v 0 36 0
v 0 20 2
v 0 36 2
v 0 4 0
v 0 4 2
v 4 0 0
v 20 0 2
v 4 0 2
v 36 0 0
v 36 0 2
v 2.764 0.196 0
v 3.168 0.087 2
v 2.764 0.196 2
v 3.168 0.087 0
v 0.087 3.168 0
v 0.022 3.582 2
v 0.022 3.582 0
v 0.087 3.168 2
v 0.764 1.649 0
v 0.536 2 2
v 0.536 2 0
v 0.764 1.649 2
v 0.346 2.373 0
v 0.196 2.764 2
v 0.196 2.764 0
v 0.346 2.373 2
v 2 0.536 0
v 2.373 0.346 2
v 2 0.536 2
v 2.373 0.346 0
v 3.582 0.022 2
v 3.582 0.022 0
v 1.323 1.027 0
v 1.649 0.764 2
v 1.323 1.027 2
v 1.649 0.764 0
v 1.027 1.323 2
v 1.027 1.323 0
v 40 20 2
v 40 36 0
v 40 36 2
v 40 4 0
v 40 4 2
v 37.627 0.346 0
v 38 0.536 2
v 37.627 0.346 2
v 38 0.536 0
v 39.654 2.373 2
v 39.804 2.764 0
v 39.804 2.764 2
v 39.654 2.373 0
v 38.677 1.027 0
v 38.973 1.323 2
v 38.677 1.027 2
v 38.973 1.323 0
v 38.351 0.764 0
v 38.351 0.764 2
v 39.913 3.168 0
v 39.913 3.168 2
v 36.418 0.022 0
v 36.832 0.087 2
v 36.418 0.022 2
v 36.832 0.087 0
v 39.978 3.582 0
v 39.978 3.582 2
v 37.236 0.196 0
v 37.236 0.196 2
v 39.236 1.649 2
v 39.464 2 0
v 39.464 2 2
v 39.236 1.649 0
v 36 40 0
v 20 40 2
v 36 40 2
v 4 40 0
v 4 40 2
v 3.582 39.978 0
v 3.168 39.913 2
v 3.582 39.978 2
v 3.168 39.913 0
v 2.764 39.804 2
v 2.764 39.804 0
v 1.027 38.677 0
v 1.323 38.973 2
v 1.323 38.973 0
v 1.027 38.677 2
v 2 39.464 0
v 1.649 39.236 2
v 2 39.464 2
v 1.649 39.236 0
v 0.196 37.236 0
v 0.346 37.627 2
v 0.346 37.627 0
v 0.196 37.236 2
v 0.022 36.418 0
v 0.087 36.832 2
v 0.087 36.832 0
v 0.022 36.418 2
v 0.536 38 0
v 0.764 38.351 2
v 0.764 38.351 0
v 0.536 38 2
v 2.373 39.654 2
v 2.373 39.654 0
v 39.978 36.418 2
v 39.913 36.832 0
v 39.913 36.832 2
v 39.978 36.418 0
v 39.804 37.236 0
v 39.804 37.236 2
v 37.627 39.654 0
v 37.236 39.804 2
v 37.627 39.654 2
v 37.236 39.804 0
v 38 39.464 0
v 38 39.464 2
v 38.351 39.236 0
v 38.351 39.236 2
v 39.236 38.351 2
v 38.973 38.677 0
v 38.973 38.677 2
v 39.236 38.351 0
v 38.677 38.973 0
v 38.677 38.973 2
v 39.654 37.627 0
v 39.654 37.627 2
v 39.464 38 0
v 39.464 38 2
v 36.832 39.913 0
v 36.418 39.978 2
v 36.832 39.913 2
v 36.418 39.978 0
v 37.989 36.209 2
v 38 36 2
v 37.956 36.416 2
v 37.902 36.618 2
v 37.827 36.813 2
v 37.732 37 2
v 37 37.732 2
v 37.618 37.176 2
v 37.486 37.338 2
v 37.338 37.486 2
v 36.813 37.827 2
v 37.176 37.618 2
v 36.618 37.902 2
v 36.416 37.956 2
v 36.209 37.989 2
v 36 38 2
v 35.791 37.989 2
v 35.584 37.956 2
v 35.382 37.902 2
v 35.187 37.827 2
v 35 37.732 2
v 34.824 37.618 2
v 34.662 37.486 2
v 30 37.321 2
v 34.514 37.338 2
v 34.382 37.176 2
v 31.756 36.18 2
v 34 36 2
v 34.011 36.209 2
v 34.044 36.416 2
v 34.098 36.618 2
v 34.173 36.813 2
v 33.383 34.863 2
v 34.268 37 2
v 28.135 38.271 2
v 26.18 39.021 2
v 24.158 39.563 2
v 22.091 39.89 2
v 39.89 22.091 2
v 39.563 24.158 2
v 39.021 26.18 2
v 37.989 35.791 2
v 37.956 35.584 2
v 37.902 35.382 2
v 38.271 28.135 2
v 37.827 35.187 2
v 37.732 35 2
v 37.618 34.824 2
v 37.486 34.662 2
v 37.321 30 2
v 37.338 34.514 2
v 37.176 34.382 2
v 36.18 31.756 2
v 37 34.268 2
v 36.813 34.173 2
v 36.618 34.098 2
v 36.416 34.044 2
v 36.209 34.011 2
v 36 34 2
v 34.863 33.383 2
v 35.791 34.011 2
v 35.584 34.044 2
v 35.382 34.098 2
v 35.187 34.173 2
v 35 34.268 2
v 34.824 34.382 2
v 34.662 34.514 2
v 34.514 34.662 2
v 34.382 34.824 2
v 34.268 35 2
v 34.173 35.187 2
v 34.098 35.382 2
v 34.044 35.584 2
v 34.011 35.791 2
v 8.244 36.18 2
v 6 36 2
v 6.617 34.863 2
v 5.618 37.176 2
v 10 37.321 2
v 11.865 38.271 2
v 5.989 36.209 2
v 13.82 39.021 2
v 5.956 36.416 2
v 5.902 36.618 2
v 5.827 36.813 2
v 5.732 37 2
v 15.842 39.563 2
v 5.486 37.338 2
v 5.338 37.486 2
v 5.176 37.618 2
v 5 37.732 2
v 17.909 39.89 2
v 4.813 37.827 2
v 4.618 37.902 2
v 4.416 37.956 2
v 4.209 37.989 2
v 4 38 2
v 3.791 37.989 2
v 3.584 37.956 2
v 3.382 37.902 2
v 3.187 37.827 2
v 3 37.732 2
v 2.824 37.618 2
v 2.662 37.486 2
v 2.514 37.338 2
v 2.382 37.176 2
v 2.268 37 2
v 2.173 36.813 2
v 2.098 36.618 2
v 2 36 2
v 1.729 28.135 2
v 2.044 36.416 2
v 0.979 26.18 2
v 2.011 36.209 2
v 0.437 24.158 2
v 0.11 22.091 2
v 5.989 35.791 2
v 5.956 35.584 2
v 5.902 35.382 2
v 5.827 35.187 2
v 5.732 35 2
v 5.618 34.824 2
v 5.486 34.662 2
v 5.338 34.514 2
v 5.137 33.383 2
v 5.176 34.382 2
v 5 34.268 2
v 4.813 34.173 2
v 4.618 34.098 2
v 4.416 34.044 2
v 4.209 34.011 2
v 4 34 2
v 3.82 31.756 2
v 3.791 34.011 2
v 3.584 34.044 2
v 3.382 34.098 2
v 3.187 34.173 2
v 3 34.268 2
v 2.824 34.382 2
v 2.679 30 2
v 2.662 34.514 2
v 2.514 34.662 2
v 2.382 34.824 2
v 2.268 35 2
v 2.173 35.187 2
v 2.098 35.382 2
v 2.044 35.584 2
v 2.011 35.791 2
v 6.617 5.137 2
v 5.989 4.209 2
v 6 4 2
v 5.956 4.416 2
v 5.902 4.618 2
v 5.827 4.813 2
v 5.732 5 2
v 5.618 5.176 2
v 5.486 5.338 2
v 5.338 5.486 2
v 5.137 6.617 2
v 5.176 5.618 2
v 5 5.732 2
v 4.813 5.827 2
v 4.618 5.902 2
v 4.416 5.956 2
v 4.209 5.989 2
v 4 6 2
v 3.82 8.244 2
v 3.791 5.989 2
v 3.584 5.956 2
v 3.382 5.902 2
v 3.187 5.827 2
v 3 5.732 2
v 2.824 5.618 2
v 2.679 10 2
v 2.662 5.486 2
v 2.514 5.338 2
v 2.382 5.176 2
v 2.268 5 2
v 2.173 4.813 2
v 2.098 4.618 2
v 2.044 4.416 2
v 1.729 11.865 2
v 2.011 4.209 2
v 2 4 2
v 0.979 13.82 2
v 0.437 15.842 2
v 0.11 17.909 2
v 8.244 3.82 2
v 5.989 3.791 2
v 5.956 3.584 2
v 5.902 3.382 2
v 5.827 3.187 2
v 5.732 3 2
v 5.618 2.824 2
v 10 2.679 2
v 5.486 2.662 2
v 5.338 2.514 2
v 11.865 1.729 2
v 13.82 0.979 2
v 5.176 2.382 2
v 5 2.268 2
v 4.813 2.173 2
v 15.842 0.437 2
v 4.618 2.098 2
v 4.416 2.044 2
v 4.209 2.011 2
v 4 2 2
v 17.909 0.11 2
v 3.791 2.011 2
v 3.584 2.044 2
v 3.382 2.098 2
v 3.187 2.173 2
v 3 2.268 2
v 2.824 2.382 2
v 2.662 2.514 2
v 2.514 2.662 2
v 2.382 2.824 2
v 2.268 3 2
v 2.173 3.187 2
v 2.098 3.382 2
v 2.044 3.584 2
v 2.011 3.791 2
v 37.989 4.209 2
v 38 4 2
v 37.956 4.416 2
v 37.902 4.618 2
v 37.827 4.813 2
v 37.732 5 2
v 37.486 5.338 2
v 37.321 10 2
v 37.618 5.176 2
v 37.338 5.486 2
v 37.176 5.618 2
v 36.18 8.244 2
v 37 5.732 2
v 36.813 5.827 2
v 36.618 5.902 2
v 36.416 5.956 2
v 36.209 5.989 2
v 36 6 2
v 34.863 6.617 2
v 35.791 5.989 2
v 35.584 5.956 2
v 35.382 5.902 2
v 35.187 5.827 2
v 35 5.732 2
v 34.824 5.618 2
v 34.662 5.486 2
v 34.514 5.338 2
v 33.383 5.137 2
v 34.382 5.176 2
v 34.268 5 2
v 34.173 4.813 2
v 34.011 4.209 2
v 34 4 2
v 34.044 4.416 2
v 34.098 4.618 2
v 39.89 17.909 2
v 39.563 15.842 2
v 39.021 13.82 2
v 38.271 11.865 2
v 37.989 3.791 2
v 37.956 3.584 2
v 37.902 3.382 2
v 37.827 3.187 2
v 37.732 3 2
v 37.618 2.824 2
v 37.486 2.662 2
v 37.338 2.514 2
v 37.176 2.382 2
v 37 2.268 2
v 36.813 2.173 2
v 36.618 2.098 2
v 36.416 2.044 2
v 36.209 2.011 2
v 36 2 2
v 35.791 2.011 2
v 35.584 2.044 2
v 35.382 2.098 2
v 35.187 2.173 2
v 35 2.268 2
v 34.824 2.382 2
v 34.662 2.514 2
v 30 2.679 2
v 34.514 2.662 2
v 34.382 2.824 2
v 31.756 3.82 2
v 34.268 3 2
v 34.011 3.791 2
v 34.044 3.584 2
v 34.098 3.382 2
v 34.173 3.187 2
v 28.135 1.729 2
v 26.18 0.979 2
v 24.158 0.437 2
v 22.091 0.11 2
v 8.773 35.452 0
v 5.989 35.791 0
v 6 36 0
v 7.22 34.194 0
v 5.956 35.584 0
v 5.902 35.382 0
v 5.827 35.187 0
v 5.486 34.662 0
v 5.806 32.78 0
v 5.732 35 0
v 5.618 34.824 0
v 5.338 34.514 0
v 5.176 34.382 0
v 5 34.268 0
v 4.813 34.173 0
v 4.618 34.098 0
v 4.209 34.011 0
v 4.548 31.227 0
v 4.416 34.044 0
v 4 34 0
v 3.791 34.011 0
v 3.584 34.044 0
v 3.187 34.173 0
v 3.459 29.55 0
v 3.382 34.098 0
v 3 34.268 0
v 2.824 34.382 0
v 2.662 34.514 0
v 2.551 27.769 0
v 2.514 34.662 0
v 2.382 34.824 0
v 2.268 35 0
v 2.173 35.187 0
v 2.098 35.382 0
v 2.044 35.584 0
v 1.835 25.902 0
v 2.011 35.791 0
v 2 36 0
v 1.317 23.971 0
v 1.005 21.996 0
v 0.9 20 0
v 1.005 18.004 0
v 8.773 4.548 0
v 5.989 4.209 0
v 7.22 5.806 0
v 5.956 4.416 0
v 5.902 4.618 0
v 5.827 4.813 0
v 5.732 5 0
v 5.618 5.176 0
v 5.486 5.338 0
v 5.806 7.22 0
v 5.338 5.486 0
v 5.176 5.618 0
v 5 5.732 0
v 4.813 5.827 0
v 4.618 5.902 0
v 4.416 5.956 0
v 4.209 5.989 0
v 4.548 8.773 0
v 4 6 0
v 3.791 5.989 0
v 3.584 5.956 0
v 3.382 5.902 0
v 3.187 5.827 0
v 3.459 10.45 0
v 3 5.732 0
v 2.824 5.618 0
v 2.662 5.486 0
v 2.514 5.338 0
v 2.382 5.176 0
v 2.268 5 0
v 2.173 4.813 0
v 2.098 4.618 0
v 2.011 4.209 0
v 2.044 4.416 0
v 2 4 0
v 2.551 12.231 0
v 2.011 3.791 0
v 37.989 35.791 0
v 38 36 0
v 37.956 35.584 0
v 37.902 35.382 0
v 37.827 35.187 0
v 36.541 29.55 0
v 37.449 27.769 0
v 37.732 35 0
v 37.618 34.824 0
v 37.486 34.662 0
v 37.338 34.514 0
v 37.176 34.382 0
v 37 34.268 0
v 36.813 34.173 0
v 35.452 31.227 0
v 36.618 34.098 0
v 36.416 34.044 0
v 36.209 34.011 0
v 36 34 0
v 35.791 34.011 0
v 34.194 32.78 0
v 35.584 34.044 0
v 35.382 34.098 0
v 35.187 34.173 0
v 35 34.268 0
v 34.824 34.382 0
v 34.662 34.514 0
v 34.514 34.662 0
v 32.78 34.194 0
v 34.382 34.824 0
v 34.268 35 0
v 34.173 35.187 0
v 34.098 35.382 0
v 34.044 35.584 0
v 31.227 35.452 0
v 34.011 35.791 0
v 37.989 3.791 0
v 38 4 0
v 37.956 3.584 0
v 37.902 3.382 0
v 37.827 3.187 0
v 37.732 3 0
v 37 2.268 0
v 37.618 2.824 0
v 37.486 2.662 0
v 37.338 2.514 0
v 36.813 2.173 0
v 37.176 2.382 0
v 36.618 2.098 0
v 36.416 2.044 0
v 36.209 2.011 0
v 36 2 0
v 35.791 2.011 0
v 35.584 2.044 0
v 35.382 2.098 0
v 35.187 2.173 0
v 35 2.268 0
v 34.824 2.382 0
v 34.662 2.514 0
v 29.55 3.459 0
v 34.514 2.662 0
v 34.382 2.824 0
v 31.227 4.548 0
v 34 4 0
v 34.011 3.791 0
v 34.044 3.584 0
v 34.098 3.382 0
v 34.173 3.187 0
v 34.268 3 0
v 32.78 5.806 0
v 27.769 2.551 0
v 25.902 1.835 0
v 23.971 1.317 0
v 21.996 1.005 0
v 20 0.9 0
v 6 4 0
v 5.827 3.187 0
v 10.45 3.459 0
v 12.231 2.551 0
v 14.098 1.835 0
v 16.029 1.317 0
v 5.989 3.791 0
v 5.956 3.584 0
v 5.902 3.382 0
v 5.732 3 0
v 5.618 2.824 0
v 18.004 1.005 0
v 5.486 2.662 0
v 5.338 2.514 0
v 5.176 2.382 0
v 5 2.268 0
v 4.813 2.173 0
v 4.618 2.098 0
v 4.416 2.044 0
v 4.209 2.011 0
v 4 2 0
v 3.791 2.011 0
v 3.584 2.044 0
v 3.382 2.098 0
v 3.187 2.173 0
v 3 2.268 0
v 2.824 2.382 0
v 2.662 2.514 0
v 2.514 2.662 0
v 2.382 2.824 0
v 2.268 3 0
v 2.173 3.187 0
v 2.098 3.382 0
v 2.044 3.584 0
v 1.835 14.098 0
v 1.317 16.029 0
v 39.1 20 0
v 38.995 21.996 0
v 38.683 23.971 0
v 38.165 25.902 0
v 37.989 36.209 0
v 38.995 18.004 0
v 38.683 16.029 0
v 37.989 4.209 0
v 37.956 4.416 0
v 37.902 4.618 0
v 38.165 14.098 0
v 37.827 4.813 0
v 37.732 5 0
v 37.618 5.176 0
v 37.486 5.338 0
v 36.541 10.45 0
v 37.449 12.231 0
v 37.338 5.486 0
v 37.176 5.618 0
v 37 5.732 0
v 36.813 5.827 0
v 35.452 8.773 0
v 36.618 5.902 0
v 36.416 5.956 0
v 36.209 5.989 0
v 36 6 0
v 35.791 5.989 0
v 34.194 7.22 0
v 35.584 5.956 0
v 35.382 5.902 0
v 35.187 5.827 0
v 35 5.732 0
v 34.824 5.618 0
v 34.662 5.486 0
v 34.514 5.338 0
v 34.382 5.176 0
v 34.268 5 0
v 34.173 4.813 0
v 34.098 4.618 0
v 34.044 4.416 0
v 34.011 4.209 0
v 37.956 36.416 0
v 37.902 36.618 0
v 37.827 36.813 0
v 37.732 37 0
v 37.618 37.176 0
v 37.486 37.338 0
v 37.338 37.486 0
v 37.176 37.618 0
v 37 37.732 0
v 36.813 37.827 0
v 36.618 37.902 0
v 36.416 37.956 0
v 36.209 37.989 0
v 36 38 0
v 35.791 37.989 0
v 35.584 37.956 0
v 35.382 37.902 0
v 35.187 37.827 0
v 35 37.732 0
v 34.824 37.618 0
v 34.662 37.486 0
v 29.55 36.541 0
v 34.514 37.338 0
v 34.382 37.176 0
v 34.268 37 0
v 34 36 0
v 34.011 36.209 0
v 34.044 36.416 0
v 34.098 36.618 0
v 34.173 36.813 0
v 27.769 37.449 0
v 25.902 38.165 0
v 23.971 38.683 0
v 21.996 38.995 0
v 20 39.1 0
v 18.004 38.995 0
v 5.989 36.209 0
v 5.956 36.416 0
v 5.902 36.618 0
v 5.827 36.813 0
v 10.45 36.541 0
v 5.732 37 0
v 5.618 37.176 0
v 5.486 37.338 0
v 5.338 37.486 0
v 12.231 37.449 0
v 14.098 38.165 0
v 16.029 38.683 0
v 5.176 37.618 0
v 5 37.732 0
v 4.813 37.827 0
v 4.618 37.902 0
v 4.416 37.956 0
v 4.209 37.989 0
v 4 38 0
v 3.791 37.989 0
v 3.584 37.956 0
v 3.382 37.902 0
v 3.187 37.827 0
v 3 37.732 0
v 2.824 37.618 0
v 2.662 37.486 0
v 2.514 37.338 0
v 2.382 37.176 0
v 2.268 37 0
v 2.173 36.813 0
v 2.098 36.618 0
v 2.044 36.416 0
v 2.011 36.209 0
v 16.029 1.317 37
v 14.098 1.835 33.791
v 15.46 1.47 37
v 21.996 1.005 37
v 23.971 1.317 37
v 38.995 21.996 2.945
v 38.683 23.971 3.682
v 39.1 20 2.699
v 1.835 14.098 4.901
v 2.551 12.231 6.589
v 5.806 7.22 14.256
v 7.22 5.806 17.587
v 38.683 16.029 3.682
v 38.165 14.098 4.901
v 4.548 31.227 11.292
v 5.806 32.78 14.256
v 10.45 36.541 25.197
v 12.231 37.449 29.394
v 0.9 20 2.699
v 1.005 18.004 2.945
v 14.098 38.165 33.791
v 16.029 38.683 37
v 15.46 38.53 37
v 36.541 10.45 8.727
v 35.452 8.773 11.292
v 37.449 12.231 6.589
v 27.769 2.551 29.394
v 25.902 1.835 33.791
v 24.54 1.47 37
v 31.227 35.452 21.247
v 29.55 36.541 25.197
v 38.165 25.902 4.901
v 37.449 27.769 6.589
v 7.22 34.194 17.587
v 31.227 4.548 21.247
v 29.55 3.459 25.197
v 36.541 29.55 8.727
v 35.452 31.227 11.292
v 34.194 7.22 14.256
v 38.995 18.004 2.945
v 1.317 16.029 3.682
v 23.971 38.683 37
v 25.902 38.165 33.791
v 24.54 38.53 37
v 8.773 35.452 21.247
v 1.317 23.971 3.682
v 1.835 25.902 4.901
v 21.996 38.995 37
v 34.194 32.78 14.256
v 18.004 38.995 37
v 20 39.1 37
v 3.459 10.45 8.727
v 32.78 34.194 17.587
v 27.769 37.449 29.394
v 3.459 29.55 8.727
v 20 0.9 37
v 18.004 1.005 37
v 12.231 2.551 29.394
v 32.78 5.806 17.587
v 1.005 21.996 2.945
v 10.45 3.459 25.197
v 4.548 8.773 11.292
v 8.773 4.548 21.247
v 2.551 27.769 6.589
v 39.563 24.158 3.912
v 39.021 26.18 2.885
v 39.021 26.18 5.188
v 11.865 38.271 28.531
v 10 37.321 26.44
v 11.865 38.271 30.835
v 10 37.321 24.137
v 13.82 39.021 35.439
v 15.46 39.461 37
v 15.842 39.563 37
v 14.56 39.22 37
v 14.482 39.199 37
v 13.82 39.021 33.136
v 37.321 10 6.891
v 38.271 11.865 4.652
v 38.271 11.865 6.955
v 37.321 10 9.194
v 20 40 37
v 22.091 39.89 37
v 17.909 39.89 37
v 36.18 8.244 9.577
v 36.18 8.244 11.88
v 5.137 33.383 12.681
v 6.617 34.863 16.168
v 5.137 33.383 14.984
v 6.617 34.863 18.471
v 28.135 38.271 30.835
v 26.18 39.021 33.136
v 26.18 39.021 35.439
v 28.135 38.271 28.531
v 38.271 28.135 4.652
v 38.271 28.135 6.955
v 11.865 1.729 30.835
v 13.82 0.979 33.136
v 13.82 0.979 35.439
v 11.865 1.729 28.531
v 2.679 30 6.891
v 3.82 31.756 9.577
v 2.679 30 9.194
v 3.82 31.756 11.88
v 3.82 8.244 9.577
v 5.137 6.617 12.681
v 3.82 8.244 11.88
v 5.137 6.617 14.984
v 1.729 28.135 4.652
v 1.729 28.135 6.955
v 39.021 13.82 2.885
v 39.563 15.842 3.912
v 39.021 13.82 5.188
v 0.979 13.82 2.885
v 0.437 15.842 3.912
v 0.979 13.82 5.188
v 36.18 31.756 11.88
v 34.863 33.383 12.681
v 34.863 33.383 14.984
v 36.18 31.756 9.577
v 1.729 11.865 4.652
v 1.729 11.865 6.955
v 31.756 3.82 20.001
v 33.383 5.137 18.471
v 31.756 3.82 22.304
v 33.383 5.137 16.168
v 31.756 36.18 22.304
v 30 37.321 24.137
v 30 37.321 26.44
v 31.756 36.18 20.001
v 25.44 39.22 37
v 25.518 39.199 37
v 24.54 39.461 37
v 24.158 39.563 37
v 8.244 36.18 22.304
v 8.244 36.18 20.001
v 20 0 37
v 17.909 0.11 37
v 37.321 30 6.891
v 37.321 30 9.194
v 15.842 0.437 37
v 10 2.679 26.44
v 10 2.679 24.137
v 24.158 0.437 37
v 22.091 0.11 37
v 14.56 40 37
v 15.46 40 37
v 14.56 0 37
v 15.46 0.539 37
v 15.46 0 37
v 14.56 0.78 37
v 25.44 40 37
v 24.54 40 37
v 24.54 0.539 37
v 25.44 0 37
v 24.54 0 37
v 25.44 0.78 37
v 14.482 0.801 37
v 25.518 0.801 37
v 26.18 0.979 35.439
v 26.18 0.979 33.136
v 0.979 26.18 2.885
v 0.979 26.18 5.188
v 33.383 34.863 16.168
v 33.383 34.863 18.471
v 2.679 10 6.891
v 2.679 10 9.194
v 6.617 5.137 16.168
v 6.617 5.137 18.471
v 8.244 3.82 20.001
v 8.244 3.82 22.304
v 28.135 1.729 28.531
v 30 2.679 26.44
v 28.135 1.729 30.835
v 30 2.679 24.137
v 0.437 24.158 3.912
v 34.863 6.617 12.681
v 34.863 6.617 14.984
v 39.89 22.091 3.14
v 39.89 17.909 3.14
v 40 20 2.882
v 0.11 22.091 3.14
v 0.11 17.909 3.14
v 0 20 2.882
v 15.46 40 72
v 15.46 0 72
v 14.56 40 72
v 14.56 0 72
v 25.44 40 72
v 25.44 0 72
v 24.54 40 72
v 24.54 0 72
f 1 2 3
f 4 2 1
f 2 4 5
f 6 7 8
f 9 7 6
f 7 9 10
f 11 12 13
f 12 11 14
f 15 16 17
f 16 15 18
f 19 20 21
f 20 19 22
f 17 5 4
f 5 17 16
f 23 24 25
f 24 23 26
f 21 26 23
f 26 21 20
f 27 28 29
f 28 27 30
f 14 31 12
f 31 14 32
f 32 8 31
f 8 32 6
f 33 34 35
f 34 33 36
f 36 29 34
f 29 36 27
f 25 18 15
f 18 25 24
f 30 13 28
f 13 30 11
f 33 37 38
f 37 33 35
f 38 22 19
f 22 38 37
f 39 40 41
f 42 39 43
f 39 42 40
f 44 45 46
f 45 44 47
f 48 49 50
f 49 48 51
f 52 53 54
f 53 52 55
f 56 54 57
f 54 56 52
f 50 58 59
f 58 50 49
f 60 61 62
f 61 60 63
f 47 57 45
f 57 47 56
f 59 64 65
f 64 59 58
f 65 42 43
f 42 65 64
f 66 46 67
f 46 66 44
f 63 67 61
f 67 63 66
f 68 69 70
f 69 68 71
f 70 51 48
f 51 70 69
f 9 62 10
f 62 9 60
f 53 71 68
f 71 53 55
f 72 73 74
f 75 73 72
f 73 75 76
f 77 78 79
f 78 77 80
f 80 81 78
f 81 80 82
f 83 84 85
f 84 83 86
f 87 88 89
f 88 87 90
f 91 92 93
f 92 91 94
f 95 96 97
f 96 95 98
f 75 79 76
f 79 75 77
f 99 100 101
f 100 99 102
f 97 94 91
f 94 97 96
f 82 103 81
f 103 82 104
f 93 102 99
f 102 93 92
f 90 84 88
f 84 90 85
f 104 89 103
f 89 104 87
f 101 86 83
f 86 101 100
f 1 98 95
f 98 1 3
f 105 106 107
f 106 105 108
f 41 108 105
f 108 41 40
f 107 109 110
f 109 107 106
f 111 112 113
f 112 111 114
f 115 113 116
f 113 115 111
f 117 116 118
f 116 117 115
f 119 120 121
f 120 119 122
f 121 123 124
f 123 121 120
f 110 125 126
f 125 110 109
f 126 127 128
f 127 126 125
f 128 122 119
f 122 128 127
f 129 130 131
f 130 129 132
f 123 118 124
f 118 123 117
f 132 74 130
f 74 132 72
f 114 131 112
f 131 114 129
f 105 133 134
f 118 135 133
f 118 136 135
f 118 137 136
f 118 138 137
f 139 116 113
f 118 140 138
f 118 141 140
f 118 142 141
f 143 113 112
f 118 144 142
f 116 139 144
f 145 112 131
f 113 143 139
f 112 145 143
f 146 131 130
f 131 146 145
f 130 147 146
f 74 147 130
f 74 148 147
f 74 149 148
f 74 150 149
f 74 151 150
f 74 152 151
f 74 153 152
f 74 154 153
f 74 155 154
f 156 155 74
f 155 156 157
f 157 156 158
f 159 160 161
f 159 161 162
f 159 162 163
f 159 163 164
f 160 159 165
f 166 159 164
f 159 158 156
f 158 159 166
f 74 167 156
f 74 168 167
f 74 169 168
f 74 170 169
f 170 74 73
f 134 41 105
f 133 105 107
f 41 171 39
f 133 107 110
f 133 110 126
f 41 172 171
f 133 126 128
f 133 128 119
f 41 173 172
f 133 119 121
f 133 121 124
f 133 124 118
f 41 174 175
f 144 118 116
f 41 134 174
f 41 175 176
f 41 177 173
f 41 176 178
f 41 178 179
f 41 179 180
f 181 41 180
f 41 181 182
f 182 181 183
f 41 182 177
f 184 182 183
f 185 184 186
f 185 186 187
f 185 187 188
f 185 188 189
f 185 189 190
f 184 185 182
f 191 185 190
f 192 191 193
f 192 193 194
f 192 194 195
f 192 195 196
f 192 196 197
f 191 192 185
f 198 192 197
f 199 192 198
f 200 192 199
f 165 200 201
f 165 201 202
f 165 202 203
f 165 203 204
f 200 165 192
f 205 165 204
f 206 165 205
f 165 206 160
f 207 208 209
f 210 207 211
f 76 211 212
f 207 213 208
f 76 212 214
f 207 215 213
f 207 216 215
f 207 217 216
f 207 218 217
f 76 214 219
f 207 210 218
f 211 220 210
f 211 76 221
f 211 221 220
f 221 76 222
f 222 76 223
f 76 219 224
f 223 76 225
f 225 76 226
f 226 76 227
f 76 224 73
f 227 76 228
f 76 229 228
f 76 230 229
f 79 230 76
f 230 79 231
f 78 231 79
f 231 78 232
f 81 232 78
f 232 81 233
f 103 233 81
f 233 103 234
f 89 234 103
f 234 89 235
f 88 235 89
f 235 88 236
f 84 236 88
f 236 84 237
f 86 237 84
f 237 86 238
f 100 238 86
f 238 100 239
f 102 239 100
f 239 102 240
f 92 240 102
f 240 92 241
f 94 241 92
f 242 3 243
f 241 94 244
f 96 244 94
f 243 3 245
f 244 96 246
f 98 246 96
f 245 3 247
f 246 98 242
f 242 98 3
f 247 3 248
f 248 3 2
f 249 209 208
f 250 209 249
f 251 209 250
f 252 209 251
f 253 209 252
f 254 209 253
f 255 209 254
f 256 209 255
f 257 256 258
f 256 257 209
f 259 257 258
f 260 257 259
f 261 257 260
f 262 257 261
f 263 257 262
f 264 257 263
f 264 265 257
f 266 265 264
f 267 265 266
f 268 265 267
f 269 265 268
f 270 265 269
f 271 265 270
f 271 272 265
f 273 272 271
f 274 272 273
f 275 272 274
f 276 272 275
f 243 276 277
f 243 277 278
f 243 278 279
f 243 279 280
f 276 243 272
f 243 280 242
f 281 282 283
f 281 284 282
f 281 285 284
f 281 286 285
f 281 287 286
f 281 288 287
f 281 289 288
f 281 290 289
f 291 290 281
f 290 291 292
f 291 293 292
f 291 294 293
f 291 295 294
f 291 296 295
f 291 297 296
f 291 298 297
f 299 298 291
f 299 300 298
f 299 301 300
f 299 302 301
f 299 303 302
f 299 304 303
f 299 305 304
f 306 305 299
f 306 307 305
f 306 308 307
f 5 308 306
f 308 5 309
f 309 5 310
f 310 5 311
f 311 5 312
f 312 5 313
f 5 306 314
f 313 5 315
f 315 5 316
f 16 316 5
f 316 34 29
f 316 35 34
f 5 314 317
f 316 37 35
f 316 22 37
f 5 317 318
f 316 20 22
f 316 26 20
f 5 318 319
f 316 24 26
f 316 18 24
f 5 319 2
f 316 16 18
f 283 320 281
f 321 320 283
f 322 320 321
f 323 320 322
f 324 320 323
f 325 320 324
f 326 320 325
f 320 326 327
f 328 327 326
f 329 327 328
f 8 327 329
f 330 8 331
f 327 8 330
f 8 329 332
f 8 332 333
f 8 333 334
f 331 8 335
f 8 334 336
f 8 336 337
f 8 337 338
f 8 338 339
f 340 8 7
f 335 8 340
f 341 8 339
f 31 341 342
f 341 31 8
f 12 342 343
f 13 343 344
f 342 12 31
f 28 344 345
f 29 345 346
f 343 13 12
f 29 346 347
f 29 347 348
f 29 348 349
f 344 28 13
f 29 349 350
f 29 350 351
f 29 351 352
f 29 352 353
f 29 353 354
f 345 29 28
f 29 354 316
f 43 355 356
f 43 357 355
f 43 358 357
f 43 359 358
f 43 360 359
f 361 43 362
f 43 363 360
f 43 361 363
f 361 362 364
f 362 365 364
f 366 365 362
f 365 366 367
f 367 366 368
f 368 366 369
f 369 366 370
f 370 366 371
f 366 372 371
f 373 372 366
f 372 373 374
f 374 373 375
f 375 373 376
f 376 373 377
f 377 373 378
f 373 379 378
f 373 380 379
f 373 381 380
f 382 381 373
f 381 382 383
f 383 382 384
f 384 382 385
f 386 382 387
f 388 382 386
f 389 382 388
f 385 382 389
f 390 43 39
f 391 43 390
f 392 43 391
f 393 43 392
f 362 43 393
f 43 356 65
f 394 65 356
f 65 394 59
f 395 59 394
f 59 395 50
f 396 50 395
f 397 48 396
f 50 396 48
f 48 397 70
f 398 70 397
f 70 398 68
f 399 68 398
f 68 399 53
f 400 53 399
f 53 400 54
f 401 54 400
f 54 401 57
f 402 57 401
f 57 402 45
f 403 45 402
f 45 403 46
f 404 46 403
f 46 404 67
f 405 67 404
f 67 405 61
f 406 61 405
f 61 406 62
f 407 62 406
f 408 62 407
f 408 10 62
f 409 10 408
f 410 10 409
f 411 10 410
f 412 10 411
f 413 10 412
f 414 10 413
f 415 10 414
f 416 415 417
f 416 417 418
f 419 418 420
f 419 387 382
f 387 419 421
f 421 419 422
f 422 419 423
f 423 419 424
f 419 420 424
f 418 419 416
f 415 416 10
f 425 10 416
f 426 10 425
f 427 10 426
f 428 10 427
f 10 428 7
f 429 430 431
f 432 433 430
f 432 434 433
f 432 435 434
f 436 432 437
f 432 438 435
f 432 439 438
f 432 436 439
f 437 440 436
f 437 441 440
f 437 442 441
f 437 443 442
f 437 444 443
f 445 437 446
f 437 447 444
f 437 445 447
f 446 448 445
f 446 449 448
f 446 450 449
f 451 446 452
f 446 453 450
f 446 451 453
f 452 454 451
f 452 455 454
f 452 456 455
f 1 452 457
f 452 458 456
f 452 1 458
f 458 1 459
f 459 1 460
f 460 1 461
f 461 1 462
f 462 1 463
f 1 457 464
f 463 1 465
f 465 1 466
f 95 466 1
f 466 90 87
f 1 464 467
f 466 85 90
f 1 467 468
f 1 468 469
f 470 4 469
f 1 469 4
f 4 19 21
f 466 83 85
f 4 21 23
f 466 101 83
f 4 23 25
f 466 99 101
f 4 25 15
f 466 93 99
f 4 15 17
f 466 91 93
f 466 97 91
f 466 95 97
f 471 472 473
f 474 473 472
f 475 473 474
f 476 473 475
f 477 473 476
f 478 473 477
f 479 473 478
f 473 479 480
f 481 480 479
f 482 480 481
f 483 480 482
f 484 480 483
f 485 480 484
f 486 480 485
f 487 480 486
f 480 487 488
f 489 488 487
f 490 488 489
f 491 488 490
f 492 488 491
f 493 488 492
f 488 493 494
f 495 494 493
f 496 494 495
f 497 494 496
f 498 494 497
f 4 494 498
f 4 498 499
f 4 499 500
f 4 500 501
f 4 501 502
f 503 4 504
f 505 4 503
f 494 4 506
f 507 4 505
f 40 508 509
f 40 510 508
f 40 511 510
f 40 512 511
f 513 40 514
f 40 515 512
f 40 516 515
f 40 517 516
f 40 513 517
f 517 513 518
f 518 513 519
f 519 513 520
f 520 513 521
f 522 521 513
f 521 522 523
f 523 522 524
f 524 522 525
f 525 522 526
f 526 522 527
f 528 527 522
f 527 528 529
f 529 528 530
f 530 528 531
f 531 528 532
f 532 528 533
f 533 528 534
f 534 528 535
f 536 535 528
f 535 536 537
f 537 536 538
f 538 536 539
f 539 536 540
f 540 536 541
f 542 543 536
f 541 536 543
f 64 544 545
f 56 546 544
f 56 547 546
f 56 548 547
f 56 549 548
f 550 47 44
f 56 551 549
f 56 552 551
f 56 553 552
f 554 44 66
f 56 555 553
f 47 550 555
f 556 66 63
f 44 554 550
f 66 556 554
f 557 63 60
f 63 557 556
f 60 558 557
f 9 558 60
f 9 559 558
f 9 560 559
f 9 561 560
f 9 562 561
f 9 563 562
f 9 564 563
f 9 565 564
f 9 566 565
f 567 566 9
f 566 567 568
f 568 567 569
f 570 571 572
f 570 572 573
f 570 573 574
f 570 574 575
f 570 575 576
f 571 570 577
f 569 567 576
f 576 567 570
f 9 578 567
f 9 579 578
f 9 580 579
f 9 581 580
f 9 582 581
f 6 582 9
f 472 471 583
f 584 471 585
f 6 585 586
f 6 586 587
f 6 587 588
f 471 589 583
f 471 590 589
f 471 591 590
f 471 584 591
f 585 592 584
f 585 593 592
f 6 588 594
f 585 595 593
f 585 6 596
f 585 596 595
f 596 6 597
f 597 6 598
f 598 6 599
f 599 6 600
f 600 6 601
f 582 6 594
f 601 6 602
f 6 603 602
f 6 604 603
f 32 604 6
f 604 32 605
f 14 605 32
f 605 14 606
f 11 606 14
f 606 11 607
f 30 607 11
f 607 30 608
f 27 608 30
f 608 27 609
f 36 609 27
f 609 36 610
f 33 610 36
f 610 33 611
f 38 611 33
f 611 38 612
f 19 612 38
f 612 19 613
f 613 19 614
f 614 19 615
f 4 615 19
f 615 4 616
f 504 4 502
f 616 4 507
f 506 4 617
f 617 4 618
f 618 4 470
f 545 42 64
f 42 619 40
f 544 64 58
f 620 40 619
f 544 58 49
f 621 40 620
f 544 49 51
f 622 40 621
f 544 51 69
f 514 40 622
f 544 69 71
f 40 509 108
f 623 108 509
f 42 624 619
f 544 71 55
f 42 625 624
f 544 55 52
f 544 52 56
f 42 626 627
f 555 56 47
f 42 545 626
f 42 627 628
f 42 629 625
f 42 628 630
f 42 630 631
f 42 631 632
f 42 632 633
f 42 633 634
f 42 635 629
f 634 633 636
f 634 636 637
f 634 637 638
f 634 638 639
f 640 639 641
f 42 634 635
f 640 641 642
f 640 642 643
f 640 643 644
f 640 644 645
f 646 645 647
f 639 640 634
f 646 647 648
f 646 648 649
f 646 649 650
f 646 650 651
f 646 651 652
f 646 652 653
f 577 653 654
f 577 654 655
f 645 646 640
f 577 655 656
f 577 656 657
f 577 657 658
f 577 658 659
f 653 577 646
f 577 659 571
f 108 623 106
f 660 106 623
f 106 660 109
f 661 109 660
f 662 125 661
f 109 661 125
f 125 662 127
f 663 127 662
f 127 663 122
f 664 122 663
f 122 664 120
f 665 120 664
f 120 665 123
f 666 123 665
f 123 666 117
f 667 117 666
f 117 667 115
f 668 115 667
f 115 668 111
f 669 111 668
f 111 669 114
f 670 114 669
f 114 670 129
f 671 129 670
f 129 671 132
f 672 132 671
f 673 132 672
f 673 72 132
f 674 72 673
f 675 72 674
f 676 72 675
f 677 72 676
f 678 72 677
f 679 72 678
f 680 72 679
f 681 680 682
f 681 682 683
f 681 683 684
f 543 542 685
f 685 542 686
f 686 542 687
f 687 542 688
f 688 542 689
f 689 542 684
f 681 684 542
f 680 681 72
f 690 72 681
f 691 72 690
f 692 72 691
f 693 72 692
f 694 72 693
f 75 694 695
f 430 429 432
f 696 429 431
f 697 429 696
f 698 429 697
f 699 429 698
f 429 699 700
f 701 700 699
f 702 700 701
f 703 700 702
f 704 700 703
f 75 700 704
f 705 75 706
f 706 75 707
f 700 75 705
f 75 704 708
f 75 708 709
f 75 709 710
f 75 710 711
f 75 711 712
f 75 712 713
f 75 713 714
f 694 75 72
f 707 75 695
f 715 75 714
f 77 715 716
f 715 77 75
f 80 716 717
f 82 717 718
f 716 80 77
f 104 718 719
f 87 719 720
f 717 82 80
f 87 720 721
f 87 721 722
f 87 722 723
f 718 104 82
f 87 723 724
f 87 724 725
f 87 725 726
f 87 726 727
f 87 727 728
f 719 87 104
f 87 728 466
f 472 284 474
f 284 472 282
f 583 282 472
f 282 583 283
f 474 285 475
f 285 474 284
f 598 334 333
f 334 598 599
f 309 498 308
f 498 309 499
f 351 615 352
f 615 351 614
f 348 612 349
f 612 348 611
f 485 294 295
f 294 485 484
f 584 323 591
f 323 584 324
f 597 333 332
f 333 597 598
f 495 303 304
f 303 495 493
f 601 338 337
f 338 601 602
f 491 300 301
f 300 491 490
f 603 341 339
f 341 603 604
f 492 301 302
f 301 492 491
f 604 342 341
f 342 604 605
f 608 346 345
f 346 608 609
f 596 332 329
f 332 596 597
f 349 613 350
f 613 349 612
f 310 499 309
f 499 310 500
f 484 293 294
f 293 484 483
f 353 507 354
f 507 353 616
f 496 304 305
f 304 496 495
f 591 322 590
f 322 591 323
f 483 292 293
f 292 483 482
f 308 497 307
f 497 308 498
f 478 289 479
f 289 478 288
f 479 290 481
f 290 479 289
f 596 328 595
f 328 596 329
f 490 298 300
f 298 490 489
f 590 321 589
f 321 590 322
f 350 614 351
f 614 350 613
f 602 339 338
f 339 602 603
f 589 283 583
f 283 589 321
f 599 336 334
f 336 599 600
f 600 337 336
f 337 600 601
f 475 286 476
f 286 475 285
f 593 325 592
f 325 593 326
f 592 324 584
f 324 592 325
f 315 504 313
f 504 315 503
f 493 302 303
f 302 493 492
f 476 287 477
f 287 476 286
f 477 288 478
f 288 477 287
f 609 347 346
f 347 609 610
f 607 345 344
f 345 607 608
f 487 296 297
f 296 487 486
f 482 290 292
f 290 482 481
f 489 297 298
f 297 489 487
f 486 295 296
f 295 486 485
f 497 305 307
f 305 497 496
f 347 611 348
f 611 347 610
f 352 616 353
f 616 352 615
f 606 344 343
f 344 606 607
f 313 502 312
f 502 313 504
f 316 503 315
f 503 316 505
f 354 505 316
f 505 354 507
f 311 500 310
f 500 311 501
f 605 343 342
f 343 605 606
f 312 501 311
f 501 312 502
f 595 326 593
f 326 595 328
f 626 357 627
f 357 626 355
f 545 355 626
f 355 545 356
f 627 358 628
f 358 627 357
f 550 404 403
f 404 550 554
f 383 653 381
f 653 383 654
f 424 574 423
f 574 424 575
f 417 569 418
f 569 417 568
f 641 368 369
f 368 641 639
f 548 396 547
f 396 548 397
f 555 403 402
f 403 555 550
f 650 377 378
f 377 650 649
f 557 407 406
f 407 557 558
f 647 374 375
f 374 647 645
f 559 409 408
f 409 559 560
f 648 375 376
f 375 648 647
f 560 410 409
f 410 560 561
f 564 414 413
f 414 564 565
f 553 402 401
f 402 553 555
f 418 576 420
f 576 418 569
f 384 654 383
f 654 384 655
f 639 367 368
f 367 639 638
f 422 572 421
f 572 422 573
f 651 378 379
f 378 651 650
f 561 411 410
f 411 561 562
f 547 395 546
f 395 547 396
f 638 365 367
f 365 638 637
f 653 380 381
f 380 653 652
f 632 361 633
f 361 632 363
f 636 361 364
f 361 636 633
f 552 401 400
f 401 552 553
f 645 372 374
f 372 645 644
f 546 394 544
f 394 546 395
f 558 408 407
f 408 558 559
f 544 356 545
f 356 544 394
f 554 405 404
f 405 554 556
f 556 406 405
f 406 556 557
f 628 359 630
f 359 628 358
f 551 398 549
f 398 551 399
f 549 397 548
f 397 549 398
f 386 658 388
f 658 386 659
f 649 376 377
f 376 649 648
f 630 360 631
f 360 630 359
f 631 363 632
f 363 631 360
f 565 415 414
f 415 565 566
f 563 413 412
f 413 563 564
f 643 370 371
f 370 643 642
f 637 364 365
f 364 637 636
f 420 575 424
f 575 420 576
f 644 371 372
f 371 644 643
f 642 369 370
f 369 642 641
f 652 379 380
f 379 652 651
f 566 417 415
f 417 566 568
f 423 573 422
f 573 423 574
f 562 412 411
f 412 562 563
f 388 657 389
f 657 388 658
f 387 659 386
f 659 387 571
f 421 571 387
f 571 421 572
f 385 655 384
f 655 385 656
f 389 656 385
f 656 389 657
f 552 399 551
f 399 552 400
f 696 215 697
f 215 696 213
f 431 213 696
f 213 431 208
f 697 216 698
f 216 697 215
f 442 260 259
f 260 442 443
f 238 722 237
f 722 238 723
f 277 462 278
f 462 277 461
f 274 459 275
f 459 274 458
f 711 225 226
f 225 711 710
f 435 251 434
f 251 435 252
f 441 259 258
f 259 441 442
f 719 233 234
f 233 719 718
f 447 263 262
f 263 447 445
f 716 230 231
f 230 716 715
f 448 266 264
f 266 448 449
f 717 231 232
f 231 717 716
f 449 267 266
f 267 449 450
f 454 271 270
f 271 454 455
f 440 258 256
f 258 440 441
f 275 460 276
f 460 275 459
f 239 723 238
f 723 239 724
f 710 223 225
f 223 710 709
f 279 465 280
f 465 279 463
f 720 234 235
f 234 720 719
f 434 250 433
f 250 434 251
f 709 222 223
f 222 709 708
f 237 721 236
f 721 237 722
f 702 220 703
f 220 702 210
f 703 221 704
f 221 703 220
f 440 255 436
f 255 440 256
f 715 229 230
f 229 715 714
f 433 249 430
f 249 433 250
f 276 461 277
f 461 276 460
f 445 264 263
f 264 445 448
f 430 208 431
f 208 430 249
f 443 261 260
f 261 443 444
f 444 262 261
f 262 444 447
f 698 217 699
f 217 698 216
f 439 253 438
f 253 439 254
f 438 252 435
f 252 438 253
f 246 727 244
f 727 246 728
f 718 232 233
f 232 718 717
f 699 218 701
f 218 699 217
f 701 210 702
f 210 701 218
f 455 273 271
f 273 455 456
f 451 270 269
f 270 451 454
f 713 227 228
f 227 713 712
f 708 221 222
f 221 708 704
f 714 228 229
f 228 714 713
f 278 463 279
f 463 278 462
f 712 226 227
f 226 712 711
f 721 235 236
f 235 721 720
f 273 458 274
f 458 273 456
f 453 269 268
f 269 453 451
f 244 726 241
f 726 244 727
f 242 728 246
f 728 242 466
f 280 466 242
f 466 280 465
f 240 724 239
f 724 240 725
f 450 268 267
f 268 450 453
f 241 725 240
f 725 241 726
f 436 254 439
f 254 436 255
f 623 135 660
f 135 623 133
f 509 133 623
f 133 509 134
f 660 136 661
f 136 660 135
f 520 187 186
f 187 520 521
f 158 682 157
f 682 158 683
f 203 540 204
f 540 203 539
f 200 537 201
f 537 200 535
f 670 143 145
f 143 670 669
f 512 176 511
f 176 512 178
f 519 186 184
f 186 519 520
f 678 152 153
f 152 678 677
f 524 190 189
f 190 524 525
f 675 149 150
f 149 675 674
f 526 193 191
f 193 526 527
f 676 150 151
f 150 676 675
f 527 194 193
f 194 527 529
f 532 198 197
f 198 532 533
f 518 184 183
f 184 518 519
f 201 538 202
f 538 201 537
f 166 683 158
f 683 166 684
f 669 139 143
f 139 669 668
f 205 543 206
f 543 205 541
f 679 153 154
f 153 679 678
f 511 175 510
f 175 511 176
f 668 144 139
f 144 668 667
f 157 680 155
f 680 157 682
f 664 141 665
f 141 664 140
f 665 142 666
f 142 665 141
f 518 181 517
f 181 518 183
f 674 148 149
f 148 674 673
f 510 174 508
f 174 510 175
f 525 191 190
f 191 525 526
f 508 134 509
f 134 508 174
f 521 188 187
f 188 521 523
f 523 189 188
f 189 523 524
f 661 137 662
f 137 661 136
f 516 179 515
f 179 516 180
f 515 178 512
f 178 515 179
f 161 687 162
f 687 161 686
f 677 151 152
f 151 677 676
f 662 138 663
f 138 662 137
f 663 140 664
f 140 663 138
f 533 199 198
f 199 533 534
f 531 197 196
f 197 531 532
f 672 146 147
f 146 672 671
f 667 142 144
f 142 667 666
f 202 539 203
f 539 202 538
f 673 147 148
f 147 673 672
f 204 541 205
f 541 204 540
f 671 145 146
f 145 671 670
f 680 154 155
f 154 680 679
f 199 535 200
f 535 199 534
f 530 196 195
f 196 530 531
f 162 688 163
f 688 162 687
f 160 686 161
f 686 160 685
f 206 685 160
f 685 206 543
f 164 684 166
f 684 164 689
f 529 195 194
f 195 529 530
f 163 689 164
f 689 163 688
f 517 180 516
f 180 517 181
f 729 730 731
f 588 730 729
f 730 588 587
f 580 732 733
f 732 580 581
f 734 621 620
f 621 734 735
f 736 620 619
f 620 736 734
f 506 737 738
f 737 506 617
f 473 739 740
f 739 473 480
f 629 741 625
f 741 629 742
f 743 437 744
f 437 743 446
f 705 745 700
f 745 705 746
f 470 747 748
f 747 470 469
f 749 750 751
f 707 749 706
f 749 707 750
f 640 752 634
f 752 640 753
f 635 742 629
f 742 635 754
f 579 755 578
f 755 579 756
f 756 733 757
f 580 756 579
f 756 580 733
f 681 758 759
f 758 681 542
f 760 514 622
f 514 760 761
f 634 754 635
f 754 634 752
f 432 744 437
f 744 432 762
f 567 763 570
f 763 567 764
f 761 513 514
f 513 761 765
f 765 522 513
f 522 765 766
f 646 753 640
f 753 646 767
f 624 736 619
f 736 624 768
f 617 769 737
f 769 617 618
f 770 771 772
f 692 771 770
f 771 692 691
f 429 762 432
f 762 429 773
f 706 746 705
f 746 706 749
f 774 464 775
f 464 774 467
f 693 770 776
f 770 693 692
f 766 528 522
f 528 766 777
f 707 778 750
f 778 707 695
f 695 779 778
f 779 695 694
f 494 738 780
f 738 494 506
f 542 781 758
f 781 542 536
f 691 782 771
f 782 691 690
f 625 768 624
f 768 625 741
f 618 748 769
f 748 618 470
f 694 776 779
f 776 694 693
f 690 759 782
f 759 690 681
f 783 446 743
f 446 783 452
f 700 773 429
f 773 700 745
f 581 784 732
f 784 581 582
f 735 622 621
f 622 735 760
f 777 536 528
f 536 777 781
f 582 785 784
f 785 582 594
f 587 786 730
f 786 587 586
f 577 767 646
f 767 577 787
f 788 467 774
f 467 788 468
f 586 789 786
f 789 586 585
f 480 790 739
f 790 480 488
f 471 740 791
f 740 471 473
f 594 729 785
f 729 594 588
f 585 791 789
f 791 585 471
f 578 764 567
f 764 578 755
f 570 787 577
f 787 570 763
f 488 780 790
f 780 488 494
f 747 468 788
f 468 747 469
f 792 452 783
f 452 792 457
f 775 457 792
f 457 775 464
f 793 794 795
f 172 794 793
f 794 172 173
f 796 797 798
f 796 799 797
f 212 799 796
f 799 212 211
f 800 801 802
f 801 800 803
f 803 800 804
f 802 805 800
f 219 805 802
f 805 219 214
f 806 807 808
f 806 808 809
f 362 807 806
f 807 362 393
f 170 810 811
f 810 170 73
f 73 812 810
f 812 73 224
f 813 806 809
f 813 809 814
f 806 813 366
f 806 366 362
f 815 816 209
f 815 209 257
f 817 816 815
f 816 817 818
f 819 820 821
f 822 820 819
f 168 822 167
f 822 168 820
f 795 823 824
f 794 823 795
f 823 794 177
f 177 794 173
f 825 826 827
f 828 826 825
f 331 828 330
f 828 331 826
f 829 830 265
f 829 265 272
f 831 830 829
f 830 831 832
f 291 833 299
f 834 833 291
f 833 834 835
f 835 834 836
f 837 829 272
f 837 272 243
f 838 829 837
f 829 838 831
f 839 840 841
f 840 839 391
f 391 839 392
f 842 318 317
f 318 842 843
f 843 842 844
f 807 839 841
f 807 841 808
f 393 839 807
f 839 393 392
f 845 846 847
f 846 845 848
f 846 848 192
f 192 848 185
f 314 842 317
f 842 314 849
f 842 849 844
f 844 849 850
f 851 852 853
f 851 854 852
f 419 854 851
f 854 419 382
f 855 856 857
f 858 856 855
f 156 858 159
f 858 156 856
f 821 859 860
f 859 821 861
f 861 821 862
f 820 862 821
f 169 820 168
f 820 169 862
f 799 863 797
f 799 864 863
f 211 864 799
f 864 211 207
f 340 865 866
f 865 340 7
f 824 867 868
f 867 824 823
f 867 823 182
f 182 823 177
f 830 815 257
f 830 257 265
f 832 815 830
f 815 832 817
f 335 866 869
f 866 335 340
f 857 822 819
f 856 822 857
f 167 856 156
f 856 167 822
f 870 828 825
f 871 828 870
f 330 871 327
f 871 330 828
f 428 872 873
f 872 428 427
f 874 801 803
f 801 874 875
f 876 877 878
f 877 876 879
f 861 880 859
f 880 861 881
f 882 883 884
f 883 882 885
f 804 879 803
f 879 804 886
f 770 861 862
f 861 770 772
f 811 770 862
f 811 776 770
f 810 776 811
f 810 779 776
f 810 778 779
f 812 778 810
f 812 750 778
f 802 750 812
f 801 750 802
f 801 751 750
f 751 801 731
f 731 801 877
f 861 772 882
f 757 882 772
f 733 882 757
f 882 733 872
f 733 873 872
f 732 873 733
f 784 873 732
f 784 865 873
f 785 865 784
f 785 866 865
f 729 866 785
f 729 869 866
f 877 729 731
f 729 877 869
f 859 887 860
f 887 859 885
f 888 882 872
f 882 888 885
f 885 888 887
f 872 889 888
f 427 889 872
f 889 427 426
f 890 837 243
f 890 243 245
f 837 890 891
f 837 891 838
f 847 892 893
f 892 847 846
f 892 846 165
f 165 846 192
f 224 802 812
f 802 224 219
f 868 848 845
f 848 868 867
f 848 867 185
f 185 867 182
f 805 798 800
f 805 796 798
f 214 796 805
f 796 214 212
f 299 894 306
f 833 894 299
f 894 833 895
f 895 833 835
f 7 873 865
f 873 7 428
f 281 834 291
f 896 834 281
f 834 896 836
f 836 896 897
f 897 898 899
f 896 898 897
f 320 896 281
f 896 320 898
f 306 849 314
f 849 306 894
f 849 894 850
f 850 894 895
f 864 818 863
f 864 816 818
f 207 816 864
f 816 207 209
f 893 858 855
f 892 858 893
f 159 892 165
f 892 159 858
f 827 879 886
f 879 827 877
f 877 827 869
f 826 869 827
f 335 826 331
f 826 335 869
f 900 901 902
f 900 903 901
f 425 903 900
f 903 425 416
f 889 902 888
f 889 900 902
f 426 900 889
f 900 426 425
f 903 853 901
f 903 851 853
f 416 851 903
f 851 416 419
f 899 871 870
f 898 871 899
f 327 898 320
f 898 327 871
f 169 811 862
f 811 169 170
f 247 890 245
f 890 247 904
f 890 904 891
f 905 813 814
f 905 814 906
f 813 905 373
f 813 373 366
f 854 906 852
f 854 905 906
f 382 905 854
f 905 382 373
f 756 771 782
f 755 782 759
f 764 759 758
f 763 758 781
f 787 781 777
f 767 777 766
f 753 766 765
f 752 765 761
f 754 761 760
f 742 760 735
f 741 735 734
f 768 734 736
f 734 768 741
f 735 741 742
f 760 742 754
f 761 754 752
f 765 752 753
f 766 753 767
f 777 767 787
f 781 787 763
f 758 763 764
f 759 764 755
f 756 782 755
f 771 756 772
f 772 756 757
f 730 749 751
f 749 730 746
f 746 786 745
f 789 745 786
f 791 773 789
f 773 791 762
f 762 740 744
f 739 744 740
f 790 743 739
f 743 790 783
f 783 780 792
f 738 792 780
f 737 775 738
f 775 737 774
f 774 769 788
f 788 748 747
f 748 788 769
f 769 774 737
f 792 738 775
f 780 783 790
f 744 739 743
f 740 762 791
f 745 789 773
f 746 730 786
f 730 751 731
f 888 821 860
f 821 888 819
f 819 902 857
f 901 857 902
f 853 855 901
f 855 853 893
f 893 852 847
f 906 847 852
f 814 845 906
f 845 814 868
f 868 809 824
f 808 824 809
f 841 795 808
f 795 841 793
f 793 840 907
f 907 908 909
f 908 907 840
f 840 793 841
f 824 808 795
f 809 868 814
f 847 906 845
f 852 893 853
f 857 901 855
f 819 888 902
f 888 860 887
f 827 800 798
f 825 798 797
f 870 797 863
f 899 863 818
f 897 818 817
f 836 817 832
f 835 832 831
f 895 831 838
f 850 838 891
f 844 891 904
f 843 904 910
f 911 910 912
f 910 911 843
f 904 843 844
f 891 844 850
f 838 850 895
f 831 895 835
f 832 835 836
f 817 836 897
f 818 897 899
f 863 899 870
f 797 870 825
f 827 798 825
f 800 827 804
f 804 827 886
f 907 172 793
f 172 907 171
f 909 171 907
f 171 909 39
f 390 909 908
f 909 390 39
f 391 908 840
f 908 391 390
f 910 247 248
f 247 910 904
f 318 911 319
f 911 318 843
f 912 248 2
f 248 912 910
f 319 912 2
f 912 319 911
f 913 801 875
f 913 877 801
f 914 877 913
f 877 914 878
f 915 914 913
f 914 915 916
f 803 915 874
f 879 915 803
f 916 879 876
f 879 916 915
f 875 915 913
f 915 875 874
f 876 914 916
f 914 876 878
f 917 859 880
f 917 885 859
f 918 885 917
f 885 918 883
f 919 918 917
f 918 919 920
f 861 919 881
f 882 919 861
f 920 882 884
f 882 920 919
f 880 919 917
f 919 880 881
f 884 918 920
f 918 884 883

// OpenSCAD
BaseBorderSize      = 40;
BaseThickness       = 2;

ScrewHoleRadius     = 2;
ScrewHoleDistance   = 32;

ConeThickness       = 0.9;
ConeBaseRadius      = BaseBorderSize/2;
ConeTopRadius       = (BaseBorderSize/2)*1;
ConeHeight          = 35;


ConePlatPartAngle   = 23 ;
OpeningRatio        = 0.2;

LengthSupport       = BaseBorderSize/2;
WidthSupport        = 10;
ThichnessSupport    = 10;

$fn = 60;


module HeadFanMount()
{
    union()
    {
    
        difference() // BASE
        {
            cube([BaseBorderSize , BaseBorderSize , BaseThickness]);
            
            translate([(BaseBorderSize-ScrewHoleDistance)/2 , (BaseBorderSize-ScrewHoleDistance)/2 , -0.5])
            {
                cylinder(h = BaseThickness + 1 , r = ScrewHoleRadius);
            }
            
            translate([BaseBorderSize-(BaseBorderSize-ScrewHoleDistance)/2 , (BaseBorderSize-ScrewHoleDistance)/2 , -0.5])
            {
                cylinder(h = BaseThickness + 1 , r = ScrewHoleRadius);
            }
            
            translate([(BaseBorderSize-ScrewHoleDistance)/2 , BaseBorderSize-(BaseBorderSize-ScrewHoleDistance)/2 , -0.5])
            {
                cylinder(h = BaseThickness + 1 , r = ScrewHoleRadius);
            }
            
            translate([BaseBorderSize-(BaseBorderSize-ScrewHoleDistance)/2 , BaseBorderSize-(BaseBorderSize-ScrewHoleDistance)/2 , -0.5])
            {
                cylinder(h = BaseThickness + 1 , r = ScrewHoleRadius);
            }
            
            translate([BaseBorderSize/2 , BaseBorderSize/2 , -0.5])
            {
                cylinder(h = BaseThickness + 1 , r = ConeBaseRadius-ConeThickness);
            }
            
            difference()
            {
                translate([0 , 0 , -0.5])
                {
                    cube([(BaseBorderSize-ScrewHoleDistance)/2 , (BaseBorderSize-ScrewHoleDistance)/2 , BaseThickness + 1]);
                }
                translate([(BaseBorderSize-ScrewHoleDistance)/2 , (BaseBorderSize-ScrewHoleDistance)/2 , -1])
                {
                    cylinder(h = BaseThickness + 2 , r = (BaseBorderSize-ScrewHoleDistance)/2);
                }
            }
            difference()
            {
                translate([BaseBorderSize-(BaseBorderSize-ScrewHoleDistance)/2 , 0 , -0.5])
                {
                    cube([(BaseBorderSize-ScrewHoleDistance)/2 , (BaseBorderSize-ScrewHoleDistance)/2 , BaseThickness + 1]);
                }
                translate([BaseBorderSize-(BaseBorderSize-ScrewHoleDistance)/2 , (BaseBorderSize-ScrewHoleDistance)/2 , -1])
                {
                    cylinder(h = BaseThickness + 2 , r = (BaseBorderSize-ScrewHoleDistance)/2);
                }
            }
            difference()
            {
                translate([0 , BaseBorderSize-(BaseBorderSize-ScrewHoleDistance)/2 , -0.5])
                {
                    cube([(BaseBorderSize-ScrewHoleDistance)/2 , (BaseBorderSize-ScrewHoleDistance)/2 , BaseThickness + 1]);
                }
                translate([(BaseBorderSize-ScrewHoleDistance)/2 , BaseBorderSize-(BaseBorderSize-ScrewHoleDistance)/2 , -1])
                {
                    cylinder(h = BaseThickness + 2 , r = (BaseBorderSize-ScrewHoleDistance)/2);
                }
            }
            difference()
            {
                translate([BaseBorderSize-(BaseBorderSize-ScrewHoleDistance)/2 , BaseBorderSize-(BaseBorderSize-ScrewHoleDistance)/2 , -0.5])
                {
                    cube([(BaseBorderSize-ScrewHoleDistance)/2 , (BaseBorderSize-ScrewHoleDistance)/2 , BaseThickness + 1]);
                }
                translate([BaseBorderSize-(BaseBorderSize-ScrewHoleDistance)/2 , BaseBorderSize-(BaseBorderSize-ScrewHoleDistance)/2 , -1])
                {
                    cylinder(h = BaseThickness + 2 , r = (BaseBorderSize-ScrewHoleDistance)/2);
                }
            }
        }
        
        
        
        
        difference()    // Cone
        {
            translate([BaseBorderSize/2 , BaseBorderSize/2 , BaseThickness])
            {
                cylinder(h = ConeHeight , r1 = ConeBaseRadius , r2 = ConeTopRadius);
            }
            translate([BaseBorderSize/2 , BaseBorderSize/2 , BaseThickness-0.1])
            {
                cylinder(h = ConeHeight+0.2 , r1 = ConeBaseRadius-ConeThickness , r2 = ConeTopRadius-ConeThickness);
            }
            translate([(BaseBorderSize/2-ConeTopRadius+ConeThickness)+(ConeHeight+BaseThickness)*tan(ConePlatPartAngle)+(ConeTopRadius/2-ConeThickness)*2*OpeningRatio+ConeTopRadius , -10 , 0])
            {
                rotate([0 , -ConePlatPartAngle , 0])
                {
                    cube([ConeHeight , BaseBorderSize+20 , (ConeHeight)/cos(ConePlatPartAngle)*2]);
                }
            }
            translate([BaseBorderSize , 0 , 0])
            {
                mirror([1 , 0 , 0])
                {
                    translate([(BaseBorderSize/2-ConeTopRadius+ConeThickness)+(ConeHeight+BaseThickness)*tan(ConePlatPartAngle)+(ConeTopRadius/2-ConeThickness)*2*OpeningRatio+ConeTopRadius , -10 , 0])
                    {
                        rotate([0 , -ConePlatPartAngle , 0])
                        {
                            cube([ConeHeight , BaseBorderSize+20 , (ConeHeight)/cos(ConePlatPartAngle)*2]);
                        }
                    }
                }
            }
        }
        
        difference()
        {
            union()
            {
                translate([(BaseBorderSize/2-ConeTopRadius+ConeThickness)+(ConeHeight+BaseThickness)*tan(ConePlatPartAngle)+(ConeTopRadius/2-ConeThickness)*2*OpeningRatio+ConeTopRadius , -10 , 0])
                {
                    rotate([0 , -ConePlatPartAngle , 0])
                    {
                        cube([ConeThickness , BaseBorderSize+20 , (ConeHeight)/cos(ConePlatPartAngle)*2]);
                    }
                }
                translate([BaseBorderSize , 0 , 0])
                {
                    mirror([1 , 0 , 0])
                    {
                        translate([(BaseBorderSize/2-ConeTopRadius+ConeThickness)+(ConeHeight+BaseThickness)*tan(ConePlatPartAngle)+(ConeTopRadius/2-ConeThickness)*2*OpeningRatio+ConeTopRadius , -10 , 0])
                        {
                            rotate([0 , -ConePlatPartAngle , 0])
                            {
                                cube([ConeThickness , BaseBorderSize+20 , (ConeHeight)/cos(ConePlatPartAngle)*2]);
                            }
                        }
                    }
                }
            }
            difference()
            {
                translate([-(ConeHeight)/cos(ConePlatPartAngle) , -BaseBorderSize/2 , -ConeHeight/2])
                {
                    cube([(ConeHeight)/cos(ConePlatPartAngle)*3 , BaseBorderSize*2 , ConeHeight*3]);
                }
                translate([BaseBorderSize/2 , BaseBorderSize/2 , BaseThickness])
                {
                    cylinder(h = ConeHeight , r1 = ConeBaseRadius , r2 = ConeTopRadius);
                }
            }
        }
        
        difference()
        {
            translate([-WidthSupport+4 , (BaseBorderSize-LengthSupport)/2 , 0])
            {
                // cube([WidthSupport+4 , LengthSupport , ThichnessSupport]);
            }
            translate([BaseBorderSize/2 , BaseBorderSize/2 , BaseThickness-0.1])
            {
                // cylinder(h = ConeHeight+0.2 , r1 = ConeBaseRadius-ConeThickness , r2 = ConeTopRadius-ConeThickness);
            }
            translate([BaseBorderSize/2 , BaseBorderSize/2 , -0.5])
            {
                // cylinder(h = BaseThickness + 1 , r = ConeBaseRadius-ConeThickness);
            }
        }
        
        translate([0 , BaseBorderSize/2 , ConeHeight+BaseThickness ])
        {
            rotate([0 , 90 , 0])
            {
                // cylinder(h = ConeTopRadius*2+1 , r = ConeTopRadius);
            }
        }
        
        translate([BaseBorderSize/2-(ConeTopRadius/2-ConeThickness)*2*OpeningRatio-ConeThickness-ConeThickness, 0 , ConeHeight+BaseThickness ])
        {
            cube([ConeThickness , BaseBorderSize , ConeHeight]);
        }

        translate([BaseBorderSize/2+(ConeTopRadius/2-ConeThickness)*2*OpeningRatio+ConeThickness , 0 , ConeHeight+BaseThickness ])
        {
            cube([ConeThickness , BaseBorderSize , ConeHeight]);
        }




     
    }


    
    // echo("BaseBorderSize/2-ConeTopRadius" , BaseBorderSize/2-ConeTopRadius);
    // echo("(BaseBorderSize/2-ConeTopRadius)*2+ConeTopRadius*2" , (BaseBorderSize/2-ConeTopRadius)*2+ConeTopRadius*2);
    
    
    
    
}

HeadFanMount();
